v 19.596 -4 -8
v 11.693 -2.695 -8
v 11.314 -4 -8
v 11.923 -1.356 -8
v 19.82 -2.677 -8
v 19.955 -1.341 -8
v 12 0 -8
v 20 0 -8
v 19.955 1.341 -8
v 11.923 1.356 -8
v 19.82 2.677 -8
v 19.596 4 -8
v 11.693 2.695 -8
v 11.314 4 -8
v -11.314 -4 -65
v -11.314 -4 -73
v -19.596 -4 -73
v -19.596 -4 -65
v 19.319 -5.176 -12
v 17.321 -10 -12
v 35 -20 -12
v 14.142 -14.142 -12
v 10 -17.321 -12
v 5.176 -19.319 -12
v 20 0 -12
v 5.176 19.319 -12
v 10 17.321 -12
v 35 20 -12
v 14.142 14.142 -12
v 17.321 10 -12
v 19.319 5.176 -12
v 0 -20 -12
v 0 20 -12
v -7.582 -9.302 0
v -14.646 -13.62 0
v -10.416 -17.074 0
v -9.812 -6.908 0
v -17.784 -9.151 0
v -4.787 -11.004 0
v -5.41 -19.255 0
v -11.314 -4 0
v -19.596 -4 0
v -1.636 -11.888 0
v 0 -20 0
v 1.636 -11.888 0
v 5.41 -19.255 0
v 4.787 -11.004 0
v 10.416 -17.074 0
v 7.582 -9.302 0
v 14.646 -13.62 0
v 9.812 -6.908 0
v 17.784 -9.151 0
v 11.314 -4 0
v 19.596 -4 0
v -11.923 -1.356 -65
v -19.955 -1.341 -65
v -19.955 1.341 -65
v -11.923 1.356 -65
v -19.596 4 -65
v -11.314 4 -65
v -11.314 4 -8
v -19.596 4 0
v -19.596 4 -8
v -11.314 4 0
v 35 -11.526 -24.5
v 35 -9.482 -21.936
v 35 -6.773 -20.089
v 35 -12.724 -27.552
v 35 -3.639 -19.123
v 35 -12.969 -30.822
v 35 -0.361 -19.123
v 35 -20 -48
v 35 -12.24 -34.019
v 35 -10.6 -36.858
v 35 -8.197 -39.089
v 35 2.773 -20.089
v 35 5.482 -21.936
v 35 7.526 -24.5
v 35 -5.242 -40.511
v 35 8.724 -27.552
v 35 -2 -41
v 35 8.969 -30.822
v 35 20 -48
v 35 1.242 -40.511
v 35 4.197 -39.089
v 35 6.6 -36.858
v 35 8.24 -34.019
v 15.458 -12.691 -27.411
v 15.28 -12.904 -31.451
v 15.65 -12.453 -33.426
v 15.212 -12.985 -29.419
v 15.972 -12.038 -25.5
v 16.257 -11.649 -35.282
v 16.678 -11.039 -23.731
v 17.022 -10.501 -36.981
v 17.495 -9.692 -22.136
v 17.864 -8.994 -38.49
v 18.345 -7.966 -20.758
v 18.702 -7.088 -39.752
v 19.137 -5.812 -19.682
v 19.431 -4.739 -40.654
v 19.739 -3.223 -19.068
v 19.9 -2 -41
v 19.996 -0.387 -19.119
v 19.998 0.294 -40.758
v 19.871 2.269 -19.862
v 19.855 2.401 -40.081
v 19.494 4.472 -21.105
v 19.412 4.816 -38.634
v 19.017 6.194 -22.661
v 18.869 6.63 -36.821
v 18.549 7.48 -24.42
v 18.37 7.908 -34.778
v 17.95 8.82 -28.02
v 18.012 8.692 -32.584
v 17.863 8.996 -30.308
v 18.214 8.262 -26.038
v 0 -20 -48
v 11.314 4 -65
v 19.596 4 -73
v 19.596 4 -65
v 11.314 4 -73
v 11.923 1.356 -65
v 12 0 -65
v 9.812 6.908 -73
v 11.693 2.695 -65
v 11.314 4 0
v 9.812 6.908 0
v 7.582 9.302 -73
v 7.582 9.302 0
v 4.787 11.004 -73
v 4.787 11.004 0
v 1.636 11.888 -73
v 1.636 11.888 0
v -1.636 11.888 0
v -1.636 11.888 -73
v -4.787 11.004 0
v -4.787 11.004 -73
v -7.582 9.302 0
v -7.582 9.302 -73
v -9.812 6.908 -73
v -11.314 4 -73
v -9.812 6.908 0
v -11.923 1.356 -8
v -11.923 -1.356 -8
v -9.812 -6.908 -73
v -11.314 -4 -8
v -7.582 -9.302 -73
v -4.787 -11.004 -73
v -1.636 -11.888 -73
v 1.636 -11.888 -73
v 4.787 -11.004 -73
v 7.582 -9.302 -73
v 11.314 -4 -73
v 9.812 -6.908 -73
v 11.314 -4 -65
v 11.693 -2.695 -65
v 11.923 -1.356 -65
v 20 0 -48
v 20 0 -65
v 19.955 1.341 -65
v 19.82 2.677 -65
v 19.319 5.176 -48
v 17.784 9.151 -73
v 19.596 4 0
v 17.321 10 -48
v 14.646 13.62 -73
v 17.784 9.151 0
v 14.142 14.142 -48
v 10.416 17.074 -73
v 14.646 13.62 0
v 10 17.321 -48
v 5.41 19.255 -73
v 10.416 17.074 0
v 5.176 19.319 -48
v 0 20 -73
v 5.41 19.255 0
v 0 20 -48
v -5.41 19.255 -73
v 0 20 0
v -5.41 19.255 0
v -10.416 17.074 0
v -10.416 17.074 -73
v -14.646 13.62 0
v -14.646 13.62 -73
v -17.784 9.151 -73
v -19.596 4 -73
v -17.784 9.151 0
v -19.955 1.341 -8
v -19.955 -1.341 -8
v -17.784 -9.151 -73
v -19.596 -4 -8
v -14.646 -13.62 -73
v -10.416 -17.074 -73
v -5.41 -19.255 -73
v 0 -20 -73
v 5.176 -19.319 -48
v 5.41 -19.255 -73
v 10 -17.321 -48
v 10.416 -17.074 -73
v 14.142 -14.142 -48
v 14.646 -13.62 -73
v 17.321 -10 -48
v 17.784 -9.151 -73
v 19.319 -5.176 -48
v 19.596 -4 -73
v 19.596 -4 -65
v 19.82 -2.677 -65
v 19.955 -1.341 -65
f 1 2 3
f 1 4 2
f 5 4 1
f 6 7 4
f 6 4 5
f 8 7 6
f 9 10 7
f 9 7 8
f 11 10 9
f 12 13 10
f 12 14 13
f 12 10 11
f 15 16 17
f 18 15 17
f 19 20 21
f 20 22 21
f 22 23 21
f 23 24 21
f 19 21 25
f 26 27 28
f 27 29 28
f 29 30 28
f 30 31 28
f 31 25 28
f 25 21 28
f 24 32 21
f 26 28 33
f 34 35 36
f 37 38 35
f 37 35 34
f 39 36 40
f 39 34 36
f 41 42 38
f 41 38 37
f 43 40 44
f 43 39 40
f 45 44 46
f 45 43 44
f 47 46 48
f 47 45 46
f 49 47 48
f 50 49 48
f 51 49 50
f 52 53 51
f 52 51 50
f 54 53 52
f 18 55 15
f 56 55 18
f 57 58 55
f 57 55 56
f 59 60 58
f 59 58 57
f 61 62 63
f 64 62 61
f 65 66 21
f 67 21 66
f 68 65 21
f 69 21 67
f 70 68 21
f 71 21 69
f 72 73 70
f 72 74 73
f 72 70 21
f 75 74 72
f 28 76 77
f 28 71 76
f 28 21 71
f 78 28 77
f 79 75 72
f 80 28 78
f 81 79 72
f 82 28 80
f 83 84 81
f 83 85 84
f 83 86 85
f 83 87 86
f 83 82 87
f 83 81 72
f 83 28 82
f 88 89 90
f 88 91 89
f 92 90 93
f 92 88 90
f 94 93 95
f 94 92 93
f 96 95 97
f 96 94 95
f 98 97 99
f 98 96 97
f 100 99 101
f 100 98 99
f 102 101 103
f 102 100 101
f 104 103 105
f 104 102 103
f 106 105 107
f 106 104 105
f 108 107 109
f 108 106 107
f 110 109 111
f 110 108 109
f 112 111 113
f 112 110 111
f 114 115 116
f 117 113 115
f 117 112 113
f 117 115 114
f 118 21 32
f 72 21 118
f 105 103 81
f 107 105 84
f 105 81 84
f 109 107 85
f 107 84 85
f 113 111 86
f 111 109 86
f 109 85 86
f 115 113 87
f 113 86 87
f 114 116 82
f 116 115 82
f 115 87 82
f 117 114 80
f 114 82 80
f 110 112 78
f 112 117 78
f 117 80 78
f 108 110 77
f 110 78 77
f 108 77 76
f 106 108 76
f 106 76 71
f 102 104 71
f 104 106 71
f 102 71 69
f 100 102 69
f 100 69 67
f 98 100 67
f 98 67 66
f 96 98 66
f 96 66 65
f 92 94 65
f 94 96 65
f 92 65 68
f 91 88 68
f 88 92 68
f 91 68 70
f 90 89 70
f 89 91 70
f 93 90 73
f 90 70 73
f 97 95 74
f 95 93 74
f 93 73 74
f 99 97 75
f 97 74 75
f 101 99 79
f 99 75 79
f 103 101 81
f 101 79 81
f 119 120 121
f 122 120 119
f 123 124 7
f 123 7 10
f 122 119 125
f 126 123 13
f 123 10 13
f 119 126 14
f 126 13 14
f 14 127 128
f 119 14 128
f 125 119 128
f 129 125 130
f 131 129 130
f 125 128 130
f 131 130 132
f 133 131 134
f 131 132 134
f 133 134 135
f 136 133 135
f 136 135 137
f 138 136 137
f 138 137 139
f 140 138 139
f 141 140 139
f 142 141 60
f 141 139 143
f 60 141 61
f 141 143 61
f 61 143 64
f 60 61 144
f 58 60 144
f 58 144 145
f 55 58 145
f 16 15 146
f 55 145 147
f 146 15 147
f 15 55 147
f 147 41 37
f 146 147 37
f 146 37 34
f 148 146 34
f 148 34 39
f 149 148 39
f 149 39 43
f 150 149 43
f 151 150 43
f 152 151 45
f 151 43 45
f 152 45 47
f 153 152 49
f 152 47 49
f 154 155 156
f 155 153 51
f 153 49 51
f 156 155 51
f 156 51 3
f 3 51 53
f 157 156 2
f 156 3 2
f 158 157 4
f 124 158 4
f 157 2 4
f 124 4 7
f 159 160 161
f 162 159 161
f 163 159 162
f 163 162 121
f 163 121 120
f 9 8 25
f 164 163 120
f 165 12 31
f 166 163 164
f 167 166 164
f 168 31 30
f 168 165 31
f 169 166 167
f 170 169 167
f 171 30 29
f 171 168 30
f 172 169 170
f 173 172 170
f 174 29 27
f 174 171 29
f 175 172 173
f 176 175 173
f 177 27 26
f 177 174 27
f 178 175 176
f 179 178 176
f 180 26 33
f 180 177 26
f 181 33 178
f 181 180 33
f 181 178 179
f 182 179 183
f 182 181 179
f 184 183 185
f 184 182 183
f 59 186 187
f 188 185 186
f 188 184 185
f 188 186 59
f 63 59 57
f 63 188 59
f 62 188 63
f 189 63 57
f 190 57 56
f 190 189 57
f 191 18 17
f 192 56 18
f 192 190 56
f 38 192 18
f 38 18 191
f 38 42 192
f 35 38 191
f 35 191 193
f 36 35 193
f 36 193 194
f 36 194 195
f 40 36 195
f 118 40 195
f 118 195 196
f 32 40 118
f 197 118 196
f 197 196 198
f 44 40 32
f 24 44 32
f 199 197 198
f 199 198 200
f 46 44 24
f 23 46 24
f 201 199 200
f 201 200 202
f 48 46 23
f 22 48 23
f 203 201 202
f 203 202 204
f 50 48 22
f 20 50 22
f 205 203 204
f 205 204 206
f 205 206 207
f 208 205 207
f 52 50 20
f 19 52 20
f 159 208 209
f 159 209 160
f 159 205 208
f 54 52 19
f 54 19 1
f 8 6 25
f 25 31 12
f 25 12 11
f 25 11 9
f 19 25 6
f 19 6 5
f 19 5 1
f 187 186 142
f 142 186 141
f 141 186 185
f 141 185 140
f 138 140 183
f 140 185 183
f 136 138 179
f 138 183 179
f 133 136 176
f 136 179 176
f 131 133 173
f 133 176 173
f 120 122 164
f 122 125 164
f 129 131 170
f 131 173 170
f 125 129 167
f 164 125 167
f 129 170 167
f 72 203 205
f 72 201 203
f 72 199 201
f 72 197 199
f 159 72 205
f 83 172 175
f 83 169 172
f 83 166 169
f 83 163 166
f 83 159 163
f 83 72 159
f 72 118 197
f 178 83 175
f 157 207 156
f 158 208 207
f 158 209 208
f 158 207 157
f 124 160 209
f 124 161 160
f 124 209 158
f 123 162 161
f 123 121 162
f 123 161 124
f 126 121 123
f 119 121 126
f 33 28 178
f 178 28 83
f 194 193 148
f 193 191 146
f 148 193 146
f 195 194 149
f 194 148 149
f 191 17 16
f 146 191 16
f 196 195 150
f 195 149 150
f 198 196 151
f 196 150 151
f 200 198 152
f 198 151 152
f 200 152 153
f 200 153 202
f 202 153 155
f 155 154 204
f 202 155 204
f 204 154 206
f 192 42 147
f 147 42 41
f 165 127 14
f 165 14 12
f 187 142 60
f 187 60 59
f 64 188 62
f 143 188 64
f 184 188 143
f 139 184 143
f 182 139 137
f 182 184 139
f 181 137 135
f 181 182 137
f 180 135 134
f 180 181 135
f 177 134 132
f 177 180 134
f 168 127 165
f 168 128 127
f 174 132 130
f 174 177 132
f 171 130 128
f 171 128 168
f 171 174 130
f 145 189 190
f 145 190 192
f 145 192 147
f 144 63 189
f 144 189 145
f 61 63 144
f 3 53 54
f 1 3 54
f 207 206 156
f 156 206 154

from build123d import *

# Parameters (mm, degrees)
SKETCH1_R           = 20
SKETCH1_R_2         = 12
BOSS_EXTRUDE1_DEPTH = 73
BOSS_EXTRUDE2_REACH = 57
SKETCH2_W           = 36
SKETCH2_H           = 40
SKETCH2_R           = 11
SKETCH4_W           = 48.323472828
SKETCH4_H           = 8
CUT_EXTRUDE1_DEPTH  = 8
SKETCH5_W           = 42.586033238
SKETCH5_H           = 8
CUT_EXTRUDE2_DEPTH  = 8


with BuildPart() as part:
    # Sketch1 → Boss-Extrude1 (new body)
    with BuildSketch(Plane.XY):
        Circle(SKETCH1_R)
        Circle(SKETCH1_R_2, mode=Mode.SUBTRACT)
    extrude(amount=-BOSS_EXTRUDE1_DEPTH)

    # Sketch2 → Boss-Extrude2 (add, up to next)
    with BuildSketch(Plane(origin=(35, 0, 0), x_dir=(0, 0, -1), z_dir=(1, 0, 0)), mode=Mode.PRIVATE) as boss_extrude2_sk1:
        with Locations((30, 0)):
            Rectangle(SKETCH2_W, SKETCH2_H)
        with Locations((30, -2)):
            Circle(SKETCH2_R, mode=Mode.SUBTRACT)
    boss_extrude2_tool1 = extrude(boss_extrude2_sk1.sketch, amount=-BOSS_EXTRUDE2_REACH, mode=Mode.PRIVATE) - part.part
    add(boss_extrude2_tool1.solids().sort_by_distance((35, -19.461855, -30))[0])

    # Sketch4 → Cut-Extrude1 (cut)
    with BuildSketch(Plane.XY):
        with Locations((-1.709156929, 0)):
            Rectangle(SKETCH4_W, SKETCH4_H)
    extrude(amount=-CUT_EXTRUDE1_DEPTH, mode=Mode.SUBTRACT)

    # Sketch5 → Cut-Extrude2 (cut)
    with BuildSketch(Plane(origin=(0, 0, -73), x_dir=(-1, 0, 0), z_dir=(0, 0, -1))):
        Rectangle(SKETCH5_W, SKETCH5_H)
    extrude(amount=-CUT_EXTRUDE2_DEPTH, mode=Mode.SUBTRACT)


solid = part.part
